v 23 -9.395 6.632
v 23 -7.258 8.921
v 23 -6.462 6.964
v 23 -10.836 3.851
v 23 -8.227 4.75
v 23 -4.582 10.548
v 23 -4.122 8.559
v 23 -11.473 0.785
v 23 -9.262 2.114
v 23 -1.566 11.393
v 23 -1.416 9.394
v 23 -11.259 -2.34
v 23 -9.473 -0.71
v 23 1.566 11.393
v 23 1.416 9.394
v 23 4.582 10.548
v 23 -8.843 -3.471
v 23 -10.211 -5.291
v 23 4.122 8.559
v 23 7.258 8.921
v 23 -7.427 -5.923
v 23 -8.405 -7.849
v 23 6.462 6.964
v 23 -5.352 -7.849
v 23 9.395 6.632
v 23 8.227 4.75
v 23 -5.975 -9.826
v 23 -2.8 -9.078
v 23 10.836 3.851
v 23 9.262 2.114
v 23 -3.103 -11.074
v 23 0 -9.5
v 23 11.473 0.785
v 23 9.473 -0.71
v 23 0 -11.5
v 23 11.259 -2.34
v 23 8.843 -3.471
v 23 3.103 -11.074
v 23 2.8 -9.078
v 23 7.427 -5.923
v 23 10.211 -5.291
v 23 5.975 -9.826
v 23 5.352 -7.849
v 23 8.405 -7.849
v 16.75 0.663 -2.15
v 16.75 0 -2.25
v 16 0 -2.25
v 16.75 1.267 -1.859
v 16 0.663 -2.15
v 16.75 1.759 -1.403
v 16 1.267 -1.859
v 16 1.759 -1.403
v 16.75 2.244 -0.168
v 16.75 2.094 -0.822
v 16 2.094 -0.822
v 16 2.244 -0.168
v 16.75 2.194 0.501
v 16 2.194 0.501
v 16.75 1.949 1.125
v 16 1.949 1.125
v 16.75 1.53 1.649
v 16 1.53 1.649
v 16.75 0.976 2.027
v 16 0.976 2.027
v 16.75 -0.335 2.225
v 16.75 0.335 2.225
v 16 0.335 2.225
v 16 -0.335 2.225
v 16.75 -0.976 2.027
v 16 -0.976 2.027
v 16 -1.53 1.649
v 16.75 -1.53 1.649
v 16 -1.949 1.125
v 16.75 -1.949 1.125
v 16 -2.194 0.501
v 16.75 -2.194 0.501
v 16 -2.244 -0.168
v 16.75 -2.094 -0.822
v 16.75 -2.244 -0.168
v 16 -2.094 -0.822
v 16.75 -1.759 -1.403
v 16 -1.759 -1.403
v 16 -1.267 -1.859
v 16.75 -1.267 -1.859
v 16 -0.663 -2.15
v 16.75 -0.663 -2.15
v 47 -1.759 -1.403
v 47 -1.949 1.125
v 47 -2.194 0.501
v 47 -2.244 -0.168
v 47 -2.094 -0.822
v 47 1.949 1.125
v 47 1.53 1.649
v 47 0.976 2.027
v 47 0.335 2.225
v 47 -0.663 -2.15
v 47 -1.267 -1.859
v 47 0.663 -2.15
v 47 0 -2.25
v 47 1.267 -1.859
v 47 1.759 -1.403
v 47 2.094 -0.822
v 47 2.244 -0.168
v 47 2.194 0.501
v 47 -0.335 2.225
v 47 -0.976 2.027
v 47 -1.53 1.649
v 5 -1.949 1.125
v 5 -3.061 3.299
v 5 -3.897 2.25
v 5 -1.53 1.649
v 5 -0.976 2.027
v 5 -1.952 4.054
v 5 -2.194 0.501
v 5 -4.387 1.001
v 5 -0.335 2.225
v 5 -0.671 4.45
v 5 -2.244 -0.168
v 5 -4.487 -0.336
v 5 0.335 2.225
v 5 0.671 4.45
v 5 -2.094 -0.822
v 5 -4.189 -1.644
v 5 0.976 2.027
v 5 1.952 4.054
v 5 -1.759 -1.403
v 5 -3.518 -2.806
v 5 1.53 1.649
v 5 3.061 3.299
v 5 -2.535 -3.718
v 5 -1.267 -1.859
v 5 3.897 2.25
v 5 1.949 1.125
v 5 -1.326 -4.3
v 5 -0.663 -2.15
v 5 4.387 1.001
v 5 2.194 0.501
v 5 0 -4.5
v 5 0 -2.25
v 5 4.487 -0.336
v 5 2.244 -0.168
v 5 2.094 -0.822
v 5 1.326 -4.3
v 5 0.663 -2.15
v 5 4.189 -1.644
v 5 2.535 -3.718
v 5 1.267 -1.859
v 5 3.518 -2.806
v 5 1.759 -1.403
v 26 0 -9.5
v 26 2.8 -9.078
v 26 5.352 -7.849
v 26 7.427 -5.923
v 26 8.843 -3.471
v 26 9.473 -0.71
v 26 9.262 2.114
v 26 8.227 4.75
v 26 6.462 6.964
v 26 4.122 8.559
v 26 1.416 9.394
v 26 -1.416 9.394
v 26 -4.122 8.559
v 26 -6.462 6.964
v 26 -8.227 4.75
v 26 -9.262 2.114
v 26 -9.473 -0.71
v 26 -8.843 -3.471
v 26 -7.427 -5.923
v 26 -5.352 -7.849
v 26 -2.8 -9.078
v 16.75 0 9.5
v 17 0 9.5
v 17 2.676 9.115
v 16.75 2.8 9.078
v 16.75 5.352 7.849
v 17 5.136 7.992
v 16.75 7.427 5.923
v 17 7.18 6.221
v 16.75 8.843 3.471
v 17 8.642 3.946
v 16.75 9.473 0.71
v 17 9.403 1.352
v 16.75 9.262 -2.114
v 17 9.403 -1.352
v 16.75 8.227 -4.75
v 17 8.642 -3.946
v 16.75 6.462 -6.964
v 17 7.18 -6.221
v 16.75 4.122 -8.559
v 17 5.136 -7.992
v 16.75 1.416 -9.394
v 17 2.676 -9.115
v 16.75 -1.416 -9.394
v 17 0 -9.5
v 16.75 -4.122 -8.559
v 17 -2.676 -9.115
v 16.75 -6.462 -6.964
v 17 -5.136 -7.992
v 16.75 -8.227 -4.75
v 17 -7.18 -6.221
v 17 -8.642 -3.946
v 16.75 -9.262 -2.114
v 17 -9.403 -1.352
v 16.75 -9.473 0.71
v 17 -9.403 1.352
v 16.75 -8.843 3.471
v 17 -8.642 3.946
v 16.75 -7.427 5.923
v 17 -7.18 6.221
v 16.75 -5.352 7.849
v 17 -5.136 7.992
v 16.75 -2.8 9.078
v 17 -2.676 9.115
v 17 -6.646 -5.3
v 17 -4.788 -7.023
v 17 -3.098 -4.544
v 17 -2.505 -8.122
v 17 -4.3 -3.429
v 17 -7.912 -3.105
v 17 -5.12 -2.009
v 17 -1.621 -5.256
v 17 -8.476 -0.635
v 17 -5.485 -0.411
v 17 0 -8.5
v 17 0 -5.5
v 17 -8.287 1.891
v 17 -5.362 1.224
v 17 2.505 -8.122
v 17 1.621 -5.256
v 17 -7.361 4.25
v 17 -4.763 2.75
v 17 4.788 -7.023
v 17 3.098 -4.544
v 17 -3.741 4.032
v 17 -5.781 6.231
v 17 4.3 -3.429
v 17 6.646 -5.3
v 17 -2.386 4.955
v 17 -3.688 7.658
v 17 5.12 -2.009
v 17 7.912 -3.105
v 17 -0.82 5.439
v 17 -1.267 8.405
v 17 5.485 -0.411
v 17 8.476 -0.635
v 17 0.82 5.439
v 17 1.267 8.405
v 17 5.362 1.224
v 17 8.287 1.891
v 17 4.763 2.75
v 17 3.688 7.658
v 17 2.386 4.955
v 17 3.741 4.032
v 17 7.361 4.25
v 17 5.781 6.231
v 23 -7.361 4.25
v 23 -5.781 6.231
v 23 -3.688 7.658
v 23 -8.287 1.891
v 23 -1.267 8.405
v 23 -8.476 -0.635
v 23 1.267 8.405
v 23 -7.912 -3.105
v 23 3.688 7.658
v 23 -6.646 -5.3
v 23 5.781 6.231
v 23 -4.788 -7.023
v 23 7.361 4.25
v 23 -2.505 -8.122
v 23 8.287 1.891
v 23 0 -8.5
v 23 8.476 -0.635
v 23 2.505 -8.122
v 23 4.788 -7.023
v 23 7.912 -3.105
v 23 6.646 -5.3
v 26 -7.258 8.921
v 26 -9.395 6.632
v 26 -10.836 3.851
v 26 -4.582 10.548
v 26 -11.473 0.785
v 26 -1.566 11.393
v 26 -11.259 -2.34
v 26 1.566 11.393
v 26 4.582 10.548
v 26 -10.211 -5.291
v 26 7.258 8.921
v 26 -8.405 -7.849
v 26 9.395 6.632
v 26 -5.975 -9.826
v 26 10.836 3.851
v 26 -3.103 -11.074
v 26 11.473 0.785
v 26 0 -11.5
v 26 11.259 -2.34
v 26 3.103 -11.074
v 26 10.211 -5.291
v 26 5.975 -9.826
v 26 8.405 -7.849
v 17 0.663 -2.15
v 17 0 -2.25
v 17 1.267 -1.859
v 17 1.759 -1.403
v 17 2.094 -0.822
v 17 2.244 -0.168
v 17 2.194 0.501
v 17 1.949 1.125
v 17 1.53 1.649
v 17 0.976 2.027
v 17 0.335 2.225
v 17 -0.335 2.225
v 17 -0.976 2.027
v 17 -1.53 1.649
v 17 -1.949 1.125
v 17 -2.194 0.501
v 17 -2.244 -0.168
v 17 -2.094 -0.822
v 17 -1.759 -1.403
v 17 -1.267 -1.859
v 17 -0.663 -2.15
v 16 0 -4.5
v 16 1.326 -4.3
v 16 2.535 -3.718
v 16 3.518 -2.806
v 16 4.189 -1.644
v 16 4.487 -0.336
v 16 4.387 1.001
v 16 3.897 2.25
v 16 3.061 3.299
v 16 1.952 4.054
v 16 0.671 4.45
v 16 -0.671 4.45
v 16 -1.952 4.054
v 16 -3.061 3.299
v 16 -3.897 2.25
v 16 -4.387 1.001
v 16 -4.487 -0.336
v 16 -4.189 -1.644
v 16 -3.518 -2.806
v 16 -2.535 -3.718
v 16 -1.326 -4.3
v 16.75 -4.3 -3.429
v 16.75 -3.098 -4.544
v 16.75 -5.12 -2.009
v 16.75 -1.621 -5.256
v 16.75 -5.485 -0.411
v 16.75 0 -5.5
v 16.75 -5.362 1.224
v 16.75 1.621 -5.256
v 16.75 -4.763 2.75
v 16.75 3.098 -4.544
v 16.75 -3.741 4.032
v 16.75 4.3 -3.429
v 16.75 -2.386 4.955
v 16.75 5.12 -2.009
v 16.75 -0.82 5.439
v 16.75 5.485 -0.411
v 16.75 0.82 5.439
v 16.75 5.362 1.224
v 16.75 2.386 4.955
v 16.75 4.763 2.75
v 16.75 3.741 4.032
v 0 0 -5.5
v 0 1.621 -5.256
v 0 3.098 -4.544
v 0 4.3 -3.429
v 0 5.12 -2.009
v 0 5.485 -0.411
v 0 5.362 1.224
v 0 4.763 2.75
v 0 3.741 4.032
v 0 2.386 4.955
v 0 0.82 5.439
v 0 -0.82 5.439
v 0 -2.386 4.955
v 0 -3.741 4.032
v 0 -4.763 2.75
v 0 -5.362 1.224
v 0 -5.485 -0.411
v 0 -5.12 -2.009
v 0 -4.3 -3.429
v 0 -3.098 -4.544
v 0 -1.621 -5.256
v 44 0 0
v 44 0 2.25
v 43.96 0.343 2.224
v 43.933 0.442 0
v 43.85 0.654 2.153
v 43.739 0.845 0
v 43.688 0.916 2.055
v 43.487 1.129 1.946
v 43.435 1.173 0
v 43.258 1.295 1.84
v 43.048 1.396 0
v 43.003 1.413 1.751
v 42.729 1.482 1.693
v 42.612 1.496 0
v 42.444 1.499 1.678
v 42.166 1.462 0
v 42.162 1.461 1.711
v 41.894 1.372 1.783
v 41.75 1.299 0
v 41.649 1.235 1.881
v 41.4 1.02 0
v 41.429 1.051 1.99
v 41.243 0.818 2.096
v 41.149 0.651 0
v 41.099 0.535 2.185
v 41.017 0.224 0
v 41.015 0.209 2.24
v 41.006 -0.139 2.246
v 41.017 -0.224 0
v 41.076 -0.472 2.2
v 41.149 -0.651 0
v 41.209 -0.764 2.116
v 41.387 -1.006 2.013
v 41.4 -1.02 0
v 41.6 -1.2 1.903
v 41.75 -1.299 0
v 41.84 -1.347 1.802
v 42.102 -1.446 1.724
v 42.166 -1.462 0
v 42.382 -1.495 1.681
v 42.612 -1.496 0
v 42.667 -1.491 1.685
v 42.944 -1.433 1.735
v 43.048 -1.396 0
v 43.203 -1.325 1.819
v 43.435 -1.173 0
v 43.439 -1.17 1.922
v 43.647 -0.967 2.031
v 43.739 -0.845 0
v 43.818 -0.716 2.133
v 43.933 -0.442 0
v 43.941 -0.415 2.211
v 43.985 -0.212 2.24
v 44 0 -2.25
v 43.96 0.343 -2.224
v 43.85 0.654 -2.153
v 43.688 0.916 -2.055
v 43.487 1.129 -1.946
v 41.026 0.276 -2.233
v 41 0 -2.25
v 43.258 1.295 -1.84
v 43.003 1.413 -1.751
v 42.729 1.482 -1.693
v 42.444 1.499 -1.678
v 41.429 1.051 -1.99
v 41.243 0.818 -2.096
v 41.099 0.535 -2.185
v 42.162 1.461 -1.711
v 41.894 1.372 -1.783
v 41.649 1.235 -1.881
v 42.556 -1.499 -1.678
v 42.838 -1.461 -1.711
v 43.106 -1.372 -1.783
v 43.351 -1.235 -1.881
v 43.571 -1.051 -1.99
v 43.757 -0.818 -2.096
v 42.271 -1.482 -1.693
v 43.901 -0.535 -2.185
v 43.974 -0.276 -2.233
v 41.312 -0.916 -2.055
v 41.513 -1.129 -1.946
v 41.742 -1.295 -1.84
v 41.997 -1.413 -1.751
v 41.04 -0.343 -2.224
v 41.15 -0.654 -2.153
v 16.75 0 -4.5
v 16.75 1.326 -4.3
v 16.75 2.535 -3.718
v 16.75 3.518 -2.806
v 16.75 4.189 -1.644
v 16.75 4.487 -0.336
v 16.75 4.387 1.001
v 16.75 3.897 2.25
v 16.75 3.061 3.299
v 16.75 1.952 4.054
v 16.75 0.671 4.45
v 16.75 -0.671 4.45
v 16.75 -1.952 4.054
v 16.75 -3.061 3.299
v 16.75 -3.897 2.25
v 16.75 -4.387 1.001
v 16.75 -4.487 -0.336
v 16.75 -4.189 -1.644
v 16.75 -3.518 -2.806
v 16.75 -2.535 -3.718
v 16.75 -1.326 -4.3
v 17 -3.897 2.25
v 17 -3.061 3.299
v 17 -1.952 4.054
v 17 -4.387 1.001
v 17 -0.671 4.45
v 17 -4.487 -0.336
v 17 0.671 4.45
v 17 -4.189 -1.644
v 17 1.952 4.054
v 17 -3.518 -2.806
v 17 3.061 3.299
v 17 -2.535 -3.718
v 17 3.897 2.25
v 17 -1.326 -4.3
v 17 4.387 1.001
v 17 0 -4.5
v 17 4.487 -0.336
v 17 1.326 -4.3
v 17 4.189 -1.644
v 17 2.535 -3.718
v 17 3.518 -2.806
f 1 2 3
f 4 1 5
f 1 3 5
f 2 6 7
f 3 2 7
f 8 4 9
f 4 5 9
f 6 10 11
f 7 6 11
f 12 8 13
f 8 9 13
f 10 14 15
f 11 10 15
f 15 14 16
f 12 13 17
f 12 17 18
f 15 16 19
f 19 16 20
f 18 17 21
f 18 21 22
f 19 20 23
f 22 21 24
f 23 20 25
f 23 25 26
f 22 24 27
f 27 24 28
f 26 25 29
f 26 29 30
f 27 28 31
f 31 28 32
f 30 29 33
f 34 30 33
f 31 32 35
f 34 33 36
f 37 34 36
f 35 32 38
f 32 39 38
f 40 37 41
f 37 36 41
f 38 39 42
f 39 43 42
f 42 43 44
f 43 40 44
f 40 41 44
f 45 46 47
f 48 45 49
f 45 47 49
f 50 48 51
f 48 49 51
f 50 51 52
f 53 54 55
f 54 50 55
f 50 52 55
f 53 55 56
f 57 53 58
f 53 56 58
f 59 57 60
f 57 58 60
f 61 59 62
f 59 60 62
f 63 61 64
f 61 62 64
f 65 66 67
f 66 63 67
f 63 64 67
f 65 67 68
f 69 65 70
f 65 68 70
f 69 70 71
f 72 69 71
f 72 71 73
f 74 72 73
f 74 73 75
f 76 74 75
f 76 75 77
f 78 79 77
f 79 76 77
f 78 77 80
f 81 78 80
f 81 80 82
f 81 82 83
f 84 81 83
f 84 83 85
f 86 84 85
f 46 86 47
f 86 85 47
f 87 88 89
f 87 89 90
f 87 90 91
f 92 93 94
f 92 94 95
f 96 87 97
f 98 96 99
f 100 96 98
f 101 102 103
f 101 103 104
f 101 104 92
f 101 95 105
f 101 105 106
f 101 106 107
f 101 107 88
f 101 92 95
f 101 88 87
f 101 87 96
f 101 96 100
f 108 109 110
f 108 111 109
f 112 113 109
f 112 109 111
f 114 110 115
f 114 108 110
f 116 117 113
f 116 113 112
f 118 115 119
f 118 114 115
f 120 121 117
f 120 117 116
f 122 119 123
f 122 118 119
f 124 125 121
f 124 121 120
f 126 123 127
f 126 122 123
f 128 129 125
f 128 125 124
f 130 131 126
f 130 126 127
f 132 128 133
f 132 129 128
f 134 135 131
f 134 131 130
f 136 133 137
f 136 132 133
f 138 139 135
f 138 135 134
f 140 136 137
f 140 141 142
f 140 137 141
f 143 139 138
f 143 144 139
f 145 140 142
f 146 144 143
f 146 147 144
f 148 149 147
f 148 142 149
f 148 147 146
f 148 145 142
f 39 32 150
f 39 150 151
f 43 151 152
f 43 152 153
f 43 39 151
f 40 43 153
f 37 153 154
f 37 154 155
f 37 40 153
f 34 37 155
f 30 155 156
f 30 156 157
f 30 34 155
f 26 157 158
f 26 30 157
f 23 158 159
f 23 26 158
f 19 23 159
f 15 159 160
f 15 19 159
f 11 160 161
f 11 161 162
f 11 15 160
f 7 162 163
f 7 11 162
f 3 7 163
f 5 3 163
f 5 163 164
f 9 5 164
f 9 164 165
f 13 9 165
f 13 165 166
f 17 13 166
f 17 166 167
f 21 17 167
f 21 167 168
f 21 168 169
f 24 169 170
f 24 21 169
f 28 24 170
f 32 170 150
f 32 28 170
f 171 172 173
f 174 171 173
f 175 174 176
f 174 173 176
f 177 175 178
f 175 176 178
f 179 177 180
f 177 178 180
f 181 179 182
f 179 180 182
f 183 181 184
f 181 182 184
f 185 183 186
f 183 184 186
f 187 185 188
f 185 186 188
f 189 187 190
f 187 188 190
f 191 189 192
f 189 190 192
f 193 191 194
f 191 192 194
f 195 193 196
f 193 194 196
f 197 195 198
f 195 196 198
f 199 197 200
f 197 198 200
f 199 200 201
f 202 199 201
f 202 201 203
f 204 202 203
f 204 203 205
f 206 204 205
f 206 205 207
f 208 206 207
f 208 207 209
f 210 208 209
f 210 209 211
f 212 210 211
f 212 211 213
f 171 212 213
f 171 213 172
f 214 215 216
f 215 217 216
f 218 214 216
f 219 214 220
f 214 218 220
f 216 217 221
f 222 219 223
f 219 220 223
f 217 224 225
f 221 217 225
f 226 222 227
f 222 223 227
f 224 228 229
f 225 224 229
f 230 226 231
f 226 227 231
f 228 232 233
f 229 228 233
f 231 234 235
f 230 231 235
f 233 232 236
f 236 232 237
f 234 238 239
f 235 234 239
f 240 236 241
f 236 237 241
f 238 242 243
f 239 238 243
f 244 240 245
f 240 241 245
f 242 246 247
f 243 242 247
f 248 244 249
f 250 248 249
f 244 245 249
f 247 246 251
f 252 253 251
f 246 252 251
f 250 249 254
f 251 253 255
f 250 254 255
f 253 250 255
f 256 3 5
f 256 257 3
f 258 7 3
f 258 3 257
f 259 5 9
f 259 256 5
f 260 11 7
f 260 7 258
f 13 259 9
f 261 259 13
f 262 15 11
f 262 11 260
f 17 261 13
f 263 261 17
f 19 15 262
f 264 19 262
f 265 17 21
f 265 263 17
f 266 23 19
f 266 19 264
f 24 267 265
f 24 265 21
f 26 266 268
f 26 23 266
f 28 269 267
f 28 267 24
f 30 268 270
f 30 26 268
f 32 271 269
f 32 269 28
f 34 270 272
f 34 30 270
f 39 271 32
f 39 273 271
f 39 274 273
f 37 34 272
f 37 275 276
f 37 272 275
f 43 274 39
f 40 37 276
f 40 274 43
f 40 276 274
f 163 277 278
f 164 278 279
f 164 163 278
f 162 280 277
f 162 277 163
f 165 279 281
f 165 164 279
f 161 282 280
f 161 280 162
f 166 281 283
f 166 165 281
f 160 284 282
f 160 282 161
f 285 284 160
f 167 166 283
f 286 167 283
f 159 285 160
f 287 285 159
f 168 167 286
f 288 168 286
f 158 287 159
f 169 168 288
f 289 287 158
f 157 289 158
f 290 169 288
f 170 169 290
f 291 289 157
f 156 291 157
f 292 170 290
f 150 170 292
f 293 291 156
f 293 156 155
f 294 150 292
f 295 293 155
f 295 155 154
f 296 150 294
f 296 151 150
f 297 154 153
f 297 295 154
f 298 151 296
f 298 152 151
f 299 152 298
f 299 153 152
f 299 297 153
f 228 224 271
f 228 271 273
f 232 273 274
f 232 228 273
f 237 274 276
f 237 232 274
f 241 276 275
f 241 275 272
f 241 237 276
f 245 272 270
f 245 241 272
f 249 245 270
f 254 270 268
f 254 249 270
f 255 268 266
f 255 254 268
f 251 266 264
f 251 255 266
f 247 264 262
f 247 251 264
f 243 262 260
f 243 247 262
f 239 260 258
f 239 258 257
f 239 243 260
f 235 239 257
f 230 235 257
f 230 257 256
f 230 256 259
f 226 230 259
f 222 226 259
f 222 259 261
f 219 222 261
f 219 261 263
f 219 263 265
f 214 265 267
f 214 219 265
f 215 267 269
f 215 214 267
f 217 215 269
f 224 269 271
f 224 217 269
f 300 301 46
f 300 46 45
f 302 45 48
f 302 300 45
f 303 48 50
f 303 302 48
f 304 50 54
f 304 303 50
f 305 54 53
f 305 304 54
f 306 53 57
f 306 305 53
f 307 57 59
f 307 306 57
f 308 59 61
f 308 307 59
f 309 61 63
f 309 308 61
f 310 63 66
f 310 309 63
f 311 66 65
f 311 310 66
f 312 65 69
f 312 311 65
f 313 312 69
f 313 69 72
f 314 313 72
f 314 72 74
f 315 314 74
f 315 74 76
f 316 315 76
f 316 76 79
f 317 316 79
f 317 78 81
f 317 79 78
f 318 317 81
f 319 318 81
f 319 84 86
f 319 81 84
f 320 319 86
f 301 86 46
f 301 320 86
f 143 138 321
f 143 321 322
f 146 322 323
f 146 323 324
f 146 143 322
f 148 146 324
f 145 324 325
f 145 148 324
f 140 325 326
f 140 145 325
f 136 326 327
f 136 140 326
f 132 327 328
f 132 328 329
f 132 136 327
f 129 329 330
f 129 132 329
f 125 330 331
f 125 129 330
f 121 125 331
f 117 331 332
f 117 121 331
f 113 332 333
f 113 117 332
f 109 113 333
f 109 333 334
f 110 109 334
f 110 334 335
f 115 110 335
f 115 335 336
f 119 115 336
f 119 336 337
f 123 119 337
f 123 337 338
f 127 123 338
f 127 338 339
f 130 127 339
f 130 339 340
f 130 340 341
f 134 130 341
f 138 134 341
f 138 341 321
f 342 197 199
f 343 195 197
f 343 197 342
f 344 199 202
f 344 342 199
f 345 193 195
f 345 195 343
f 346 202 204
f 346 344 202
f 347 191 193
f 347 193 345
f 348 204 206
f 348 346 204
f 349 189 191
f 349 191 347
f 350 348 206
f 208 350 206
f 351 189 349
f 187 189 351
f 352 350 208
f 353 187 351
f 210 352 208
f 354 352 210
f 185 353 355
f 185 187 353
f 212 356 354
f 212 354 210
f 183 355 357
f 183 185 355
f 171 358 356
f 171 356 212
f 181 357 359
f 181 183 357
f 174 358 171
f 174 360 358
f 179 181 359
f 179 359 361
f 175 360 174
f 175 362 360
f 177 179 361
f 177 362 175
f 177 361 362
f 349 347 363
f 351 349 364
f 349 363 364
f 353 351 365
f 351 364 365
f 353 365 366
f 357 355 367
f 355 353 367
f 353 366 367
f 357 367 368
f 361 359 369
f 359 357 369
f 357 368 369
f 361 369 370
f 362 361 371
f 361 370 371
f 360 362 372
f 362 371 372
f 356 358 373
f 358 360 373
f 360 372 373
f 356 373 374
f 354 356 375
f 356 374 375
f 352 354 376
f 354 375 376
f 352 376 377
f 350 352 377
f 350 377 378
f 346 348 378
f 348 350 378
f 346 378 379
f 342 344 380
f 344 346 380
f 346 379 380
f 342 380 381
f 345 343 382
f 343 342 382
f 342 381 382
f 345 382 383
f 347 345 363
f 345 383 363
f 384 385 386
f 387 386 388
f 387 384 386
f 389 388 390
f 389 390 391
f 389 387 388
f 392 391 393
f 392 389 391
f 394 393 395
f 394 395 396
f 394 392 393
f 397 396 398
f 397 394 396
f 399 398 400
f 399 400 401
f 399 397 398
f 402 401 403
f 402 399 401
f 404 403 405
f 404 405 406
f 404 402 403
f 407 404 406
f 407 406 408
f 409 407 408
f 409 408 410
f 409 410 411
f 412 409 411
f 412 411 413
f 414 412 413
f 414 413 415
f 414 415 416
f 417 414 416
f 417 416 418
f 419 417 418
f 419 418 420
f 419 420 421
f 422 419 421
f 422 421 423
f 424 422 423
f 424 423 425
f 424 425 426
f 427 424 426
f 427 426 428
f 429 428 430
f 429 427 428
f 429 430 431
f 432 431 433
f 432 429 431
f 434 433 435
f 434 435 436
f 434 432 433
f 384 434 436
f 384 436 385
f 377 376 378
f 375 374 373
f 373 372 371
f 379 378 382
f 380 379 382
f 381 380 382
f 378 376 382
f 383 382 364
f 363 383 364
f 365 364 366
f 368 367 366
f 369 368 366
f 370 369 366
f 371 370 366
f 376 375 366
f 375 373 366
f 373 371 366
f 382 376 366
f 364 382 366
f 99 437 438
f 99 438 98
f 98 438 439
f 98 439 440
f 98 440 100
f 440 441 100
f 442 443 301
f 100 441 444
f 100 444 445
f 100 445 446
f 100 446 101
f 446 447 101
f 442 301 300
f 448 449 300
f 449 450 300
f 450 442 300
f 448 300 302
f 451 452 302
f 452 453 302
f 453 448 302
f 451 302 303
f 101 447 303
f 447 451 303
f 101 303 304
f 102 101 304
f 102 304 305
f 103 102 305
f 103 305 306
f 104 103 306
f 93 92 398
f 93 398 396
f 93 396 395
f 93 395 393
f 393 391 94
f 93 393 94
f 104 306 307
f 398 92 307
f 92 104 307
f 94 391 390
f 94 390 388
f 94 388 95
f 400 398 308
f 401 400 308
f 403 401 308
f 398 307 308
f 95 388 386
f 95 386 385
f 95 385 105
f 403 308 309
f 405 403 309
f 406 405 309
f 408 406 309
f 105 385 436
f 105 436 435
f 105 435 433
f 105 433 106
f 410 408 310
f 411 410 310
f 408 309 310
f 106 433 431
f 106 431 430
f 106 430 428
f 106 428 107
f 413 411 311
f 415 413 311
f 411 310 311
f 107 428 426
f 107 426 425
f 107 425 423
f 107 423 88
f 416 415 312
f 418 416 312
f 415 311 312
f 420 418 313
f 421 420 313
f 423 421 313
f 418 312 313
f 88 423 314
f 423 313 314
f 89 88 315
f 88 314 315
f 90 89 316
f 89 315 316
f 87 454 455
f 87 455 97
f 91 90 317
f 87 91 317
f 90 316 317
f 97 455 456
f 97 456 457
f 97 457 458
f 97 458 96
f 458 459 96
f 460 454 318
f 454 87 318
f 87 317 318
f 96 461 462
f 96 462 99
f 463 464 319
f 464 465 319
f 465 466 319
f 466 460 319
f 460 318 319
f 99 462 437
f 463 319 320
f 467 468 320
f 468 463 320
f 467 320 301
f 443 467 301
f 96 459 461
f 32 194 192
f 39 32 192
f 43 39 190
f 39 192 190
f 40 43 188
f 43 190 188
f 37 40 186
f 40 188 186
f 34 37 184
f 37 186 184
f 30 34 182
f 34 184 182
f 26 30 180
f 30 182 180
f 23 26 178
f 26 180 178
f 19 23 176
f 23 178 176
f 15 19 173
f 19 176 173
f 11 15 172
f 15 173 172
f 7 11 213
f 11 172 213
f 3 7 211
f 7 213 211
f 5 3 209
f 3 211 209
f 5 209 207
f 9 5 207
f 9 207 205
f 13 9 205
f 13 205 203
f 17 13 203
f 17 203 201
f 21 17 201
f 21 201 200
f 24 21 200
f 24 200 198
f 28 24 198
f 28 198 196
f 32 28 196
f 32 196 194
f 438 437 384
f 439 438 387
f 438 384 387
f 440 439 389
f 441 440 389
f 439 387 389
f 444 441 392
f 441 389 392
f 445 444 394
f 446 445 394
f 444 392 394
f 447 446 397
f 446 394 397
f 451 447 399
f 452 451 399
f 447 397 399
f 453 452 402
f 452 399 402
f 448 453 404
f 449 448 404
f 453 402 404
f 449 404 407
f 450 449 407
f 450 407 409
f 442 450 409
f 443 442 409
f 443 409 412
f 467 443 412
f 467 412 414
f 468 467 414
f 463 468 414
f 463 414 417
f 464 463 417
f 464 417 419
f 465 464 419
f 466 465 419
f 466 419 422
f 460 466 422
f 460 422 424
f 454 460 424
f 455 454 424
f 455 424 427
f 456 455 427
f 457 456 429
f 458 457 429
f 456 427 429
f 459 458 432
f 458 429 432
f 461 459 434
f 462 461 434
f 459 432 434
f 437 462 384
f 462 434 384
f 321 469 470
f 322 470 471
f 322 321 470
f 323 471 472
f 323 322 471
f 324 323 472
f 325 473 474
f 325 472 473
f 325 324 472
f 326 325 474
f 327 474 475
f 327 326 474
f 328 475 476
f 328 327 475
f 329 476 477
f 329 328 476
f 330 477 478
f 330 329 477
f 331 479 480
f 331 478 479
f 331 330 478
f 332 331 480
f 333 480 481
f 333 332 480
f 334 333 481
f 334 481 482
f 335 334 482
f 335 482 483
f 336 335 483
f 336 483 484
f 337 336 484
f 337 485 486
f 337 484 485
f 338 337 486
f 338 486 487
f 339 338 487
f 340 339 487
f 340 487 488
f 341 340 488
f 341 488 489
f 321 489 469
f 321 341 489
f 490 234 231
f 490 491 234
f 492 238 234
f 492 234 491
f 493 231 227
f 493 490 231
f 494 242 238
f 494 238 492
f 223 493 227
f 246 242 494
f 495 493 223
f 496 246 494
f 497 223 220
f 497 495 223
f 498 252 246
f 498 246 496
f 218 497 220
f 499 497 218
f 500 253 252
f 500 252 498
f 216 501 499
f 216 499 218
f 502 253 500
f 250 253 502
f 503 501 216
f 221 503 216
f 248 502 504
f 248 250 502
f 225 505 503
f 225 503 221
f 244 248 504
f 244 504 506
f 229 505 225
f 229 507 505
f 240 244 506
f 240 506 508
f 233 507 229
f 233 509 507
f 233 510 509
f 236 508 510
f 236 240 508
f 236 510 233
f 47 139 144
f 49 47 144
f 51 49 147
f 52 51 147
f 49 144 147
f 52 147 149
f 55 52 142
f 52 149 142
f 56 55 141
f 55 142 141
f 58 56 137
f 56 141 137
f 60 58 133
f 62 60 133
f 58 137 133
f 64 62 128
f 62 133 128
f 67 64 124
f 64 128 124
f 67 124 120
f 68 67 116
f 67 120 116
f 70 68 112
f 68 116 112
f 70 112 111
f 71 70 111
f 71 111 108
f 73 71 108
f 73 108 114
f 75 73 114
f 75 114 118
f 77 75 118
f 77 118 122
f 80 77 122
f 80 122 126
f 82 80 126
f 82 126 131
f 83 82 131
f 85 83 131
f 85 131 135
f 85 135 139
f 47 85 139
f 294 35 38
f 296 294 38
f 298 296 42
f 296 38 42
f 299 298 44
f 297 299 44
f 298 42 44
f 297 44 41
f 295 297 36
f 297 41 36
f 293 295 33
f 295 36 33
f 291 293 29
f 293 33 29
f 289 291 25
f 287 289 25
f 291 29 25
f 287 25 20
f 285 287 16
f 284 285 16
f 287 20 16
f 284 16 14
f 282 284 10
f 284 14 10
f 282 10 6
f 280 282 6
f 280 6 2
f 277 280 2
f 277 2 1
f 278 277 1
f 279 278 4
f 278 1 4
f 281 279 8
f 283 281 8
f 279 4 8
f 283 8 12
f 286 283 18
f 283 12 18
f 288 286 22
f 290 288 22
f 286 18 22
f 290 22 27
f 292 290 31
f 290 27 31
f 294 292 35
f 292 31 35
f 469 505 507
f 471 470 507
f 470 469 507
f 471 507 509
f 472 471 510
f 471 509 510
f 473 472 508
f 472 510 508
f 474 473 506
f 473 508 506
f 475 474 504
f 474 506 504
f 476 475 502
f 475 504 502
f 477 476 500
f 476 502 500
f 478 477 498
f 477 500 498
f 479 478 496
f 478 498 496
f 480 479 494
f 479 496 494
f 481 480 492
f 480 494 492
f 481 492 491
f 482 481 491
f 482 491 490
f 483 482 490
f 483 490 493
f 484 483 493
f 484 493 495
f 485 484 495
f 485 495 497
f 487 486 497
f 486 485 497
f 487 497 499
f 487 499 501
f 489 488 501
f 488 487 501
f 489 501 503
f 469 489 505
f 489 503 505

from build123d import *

# Parameters (mm, degrees)
SKETCH1_R               = 5.5
BOSS_EXTRUDE1_DEPTH     = 5
SKETCH2_R               = 5.5
SKETCH2_R_2             = 4.5
BOSS_EXTRUDE2_DEPTH     = 12
SKETCH3_R               = 2.25
BOSS_EXTRUDE3_DEPTH     = 42
SKETCH4_R               = 9.5
SKETCH4_R_2             = 8.5
BOSS_EXTRUDE4_DEPTH     = 6
SKETCH5_R               = 9.5
BOSS_EXTRUDE5_DEPTH     = 0.25
SKETCH6_R               = 11.5
SKETCH6_R_2             = 9.5
BOSS_EXTRUDE6_DEPTH     = 3
SKETCH7_R               = 1.5
CUT_EXTRUDE1_DEPTH      = 12.5
CUT_EXTRUDE1_DEPTH_BACK = 12.5
SKETCH9_R               = 4.5
SKETCH9_R_2             = 2.25
CUT_EXTRUDE3_DEPTH      = 1


with BuildPart() as part:
    # Sketch1 → Boss-Extrude1 (new body)
    with BuildSketch(Plane(origin=(0, 0, 0), x_dir=(0, 0, -1), z_dir=(1, 0, 0))):
        Circle(SKETCH1_R)
    extrude(amount=BOSS_EXTRUDE1_DEPTH)

    # Sketch2 → Boss-Extrude2 (add)
    with BuildSketch(Plane(origin=(5, 0, 0), x_dir=(0, 0, -1), z_dir=(1, 0, 0))):
        Circle(SKETCH2_R)
        Circle(SKETCH2_R_2, mode=Mode.SUBTRACT)
    extrude(amount=BOSS_EXTRUDE2_DEPTH)

    # Sketch3 → Boss-Extrude3 (add)
    with BuildSketch(Plane(origin=(5, 0, 0), x_dir=(0, 0, -1), z_dir=(1, 0, 0))):
        Circle(SKETCH3_R)
    extrude(amount=BOSS_EXTRUDE3_DEPTH)



with BuildPart() as body_2:
    # Sketch4 → Boss-Extrude4 (new body)
    with BuildSketch(Plane(origin=(17, 0, 0), x_dir=(0, 0, -1), z_dir=(1, 0, 0))):
        Circle(SKETCH4_R)
        Circle(SKETCH4_R_2, mode=Mode.SUBTRACT)
    extrude(amount=BOSS_EXTRUDE4_DEPTH)


with BuildPart() as part_1:
    add(part.part)

    add(body_2.part)  # Boss-Extrude5 merges body 2
    # Sketch5 → Boss-Extrude5 (add)
    with BuildSketch(Plane.ZY.offset(-17)):
        Circle(SKETCH5_R)
    extrude(amount=BOSS_EXTRUDE5_DEPTH)

    # Sketch7 → Cut-Extrude1 (cut, two sides)
    with BuildSketch(Plane.XY) as cut_extrude1_sk:
        with Locations((42.5, 0)):
            Circle(SKETCH7_R)
    extrude(amount=CUT_EXTRUDE1_DEPTH, mode=Mode.SUBTRACT)
    extrude(cut_extrude1_sk.sketch, amount=-CUT_EXTRUDE1_DEPTH_BACK, mode=Mode.SUBTRACT)

    # Sketch9 → Cut-Extrude3 (cut)
    with BuildSketch(Plane(origin=(17, 0, 0), x_dir=(0, 0, -1), z_dir=(1, 0, 0))):
        Circle(SKETCH9_R)
        Circle(SKETCH9_R_2, mode=Mode.SUBTRACT)
    extrude(amount=-CUT_EXTRUDE3_DEPTH, mode=Mode.SUBTRACT)


with BuildPart() as body_2_2:
    # Sketch6 → Boss-Extrude6 (new body)
    with BuildSketch(Plane(origin=(23, 0, 0), x_dir=(0, 0, -1), z_dir=(1, 0, 0))):
        Circle(SKETCH6_R)
        Circle(SKETCH6_R_2, mode=Mode.SUBTRACT)
    extrude(amount=BOSS_EXTRUDE6_DEPTH)


solid = Compound([part_1.part, body_2_2.part])
